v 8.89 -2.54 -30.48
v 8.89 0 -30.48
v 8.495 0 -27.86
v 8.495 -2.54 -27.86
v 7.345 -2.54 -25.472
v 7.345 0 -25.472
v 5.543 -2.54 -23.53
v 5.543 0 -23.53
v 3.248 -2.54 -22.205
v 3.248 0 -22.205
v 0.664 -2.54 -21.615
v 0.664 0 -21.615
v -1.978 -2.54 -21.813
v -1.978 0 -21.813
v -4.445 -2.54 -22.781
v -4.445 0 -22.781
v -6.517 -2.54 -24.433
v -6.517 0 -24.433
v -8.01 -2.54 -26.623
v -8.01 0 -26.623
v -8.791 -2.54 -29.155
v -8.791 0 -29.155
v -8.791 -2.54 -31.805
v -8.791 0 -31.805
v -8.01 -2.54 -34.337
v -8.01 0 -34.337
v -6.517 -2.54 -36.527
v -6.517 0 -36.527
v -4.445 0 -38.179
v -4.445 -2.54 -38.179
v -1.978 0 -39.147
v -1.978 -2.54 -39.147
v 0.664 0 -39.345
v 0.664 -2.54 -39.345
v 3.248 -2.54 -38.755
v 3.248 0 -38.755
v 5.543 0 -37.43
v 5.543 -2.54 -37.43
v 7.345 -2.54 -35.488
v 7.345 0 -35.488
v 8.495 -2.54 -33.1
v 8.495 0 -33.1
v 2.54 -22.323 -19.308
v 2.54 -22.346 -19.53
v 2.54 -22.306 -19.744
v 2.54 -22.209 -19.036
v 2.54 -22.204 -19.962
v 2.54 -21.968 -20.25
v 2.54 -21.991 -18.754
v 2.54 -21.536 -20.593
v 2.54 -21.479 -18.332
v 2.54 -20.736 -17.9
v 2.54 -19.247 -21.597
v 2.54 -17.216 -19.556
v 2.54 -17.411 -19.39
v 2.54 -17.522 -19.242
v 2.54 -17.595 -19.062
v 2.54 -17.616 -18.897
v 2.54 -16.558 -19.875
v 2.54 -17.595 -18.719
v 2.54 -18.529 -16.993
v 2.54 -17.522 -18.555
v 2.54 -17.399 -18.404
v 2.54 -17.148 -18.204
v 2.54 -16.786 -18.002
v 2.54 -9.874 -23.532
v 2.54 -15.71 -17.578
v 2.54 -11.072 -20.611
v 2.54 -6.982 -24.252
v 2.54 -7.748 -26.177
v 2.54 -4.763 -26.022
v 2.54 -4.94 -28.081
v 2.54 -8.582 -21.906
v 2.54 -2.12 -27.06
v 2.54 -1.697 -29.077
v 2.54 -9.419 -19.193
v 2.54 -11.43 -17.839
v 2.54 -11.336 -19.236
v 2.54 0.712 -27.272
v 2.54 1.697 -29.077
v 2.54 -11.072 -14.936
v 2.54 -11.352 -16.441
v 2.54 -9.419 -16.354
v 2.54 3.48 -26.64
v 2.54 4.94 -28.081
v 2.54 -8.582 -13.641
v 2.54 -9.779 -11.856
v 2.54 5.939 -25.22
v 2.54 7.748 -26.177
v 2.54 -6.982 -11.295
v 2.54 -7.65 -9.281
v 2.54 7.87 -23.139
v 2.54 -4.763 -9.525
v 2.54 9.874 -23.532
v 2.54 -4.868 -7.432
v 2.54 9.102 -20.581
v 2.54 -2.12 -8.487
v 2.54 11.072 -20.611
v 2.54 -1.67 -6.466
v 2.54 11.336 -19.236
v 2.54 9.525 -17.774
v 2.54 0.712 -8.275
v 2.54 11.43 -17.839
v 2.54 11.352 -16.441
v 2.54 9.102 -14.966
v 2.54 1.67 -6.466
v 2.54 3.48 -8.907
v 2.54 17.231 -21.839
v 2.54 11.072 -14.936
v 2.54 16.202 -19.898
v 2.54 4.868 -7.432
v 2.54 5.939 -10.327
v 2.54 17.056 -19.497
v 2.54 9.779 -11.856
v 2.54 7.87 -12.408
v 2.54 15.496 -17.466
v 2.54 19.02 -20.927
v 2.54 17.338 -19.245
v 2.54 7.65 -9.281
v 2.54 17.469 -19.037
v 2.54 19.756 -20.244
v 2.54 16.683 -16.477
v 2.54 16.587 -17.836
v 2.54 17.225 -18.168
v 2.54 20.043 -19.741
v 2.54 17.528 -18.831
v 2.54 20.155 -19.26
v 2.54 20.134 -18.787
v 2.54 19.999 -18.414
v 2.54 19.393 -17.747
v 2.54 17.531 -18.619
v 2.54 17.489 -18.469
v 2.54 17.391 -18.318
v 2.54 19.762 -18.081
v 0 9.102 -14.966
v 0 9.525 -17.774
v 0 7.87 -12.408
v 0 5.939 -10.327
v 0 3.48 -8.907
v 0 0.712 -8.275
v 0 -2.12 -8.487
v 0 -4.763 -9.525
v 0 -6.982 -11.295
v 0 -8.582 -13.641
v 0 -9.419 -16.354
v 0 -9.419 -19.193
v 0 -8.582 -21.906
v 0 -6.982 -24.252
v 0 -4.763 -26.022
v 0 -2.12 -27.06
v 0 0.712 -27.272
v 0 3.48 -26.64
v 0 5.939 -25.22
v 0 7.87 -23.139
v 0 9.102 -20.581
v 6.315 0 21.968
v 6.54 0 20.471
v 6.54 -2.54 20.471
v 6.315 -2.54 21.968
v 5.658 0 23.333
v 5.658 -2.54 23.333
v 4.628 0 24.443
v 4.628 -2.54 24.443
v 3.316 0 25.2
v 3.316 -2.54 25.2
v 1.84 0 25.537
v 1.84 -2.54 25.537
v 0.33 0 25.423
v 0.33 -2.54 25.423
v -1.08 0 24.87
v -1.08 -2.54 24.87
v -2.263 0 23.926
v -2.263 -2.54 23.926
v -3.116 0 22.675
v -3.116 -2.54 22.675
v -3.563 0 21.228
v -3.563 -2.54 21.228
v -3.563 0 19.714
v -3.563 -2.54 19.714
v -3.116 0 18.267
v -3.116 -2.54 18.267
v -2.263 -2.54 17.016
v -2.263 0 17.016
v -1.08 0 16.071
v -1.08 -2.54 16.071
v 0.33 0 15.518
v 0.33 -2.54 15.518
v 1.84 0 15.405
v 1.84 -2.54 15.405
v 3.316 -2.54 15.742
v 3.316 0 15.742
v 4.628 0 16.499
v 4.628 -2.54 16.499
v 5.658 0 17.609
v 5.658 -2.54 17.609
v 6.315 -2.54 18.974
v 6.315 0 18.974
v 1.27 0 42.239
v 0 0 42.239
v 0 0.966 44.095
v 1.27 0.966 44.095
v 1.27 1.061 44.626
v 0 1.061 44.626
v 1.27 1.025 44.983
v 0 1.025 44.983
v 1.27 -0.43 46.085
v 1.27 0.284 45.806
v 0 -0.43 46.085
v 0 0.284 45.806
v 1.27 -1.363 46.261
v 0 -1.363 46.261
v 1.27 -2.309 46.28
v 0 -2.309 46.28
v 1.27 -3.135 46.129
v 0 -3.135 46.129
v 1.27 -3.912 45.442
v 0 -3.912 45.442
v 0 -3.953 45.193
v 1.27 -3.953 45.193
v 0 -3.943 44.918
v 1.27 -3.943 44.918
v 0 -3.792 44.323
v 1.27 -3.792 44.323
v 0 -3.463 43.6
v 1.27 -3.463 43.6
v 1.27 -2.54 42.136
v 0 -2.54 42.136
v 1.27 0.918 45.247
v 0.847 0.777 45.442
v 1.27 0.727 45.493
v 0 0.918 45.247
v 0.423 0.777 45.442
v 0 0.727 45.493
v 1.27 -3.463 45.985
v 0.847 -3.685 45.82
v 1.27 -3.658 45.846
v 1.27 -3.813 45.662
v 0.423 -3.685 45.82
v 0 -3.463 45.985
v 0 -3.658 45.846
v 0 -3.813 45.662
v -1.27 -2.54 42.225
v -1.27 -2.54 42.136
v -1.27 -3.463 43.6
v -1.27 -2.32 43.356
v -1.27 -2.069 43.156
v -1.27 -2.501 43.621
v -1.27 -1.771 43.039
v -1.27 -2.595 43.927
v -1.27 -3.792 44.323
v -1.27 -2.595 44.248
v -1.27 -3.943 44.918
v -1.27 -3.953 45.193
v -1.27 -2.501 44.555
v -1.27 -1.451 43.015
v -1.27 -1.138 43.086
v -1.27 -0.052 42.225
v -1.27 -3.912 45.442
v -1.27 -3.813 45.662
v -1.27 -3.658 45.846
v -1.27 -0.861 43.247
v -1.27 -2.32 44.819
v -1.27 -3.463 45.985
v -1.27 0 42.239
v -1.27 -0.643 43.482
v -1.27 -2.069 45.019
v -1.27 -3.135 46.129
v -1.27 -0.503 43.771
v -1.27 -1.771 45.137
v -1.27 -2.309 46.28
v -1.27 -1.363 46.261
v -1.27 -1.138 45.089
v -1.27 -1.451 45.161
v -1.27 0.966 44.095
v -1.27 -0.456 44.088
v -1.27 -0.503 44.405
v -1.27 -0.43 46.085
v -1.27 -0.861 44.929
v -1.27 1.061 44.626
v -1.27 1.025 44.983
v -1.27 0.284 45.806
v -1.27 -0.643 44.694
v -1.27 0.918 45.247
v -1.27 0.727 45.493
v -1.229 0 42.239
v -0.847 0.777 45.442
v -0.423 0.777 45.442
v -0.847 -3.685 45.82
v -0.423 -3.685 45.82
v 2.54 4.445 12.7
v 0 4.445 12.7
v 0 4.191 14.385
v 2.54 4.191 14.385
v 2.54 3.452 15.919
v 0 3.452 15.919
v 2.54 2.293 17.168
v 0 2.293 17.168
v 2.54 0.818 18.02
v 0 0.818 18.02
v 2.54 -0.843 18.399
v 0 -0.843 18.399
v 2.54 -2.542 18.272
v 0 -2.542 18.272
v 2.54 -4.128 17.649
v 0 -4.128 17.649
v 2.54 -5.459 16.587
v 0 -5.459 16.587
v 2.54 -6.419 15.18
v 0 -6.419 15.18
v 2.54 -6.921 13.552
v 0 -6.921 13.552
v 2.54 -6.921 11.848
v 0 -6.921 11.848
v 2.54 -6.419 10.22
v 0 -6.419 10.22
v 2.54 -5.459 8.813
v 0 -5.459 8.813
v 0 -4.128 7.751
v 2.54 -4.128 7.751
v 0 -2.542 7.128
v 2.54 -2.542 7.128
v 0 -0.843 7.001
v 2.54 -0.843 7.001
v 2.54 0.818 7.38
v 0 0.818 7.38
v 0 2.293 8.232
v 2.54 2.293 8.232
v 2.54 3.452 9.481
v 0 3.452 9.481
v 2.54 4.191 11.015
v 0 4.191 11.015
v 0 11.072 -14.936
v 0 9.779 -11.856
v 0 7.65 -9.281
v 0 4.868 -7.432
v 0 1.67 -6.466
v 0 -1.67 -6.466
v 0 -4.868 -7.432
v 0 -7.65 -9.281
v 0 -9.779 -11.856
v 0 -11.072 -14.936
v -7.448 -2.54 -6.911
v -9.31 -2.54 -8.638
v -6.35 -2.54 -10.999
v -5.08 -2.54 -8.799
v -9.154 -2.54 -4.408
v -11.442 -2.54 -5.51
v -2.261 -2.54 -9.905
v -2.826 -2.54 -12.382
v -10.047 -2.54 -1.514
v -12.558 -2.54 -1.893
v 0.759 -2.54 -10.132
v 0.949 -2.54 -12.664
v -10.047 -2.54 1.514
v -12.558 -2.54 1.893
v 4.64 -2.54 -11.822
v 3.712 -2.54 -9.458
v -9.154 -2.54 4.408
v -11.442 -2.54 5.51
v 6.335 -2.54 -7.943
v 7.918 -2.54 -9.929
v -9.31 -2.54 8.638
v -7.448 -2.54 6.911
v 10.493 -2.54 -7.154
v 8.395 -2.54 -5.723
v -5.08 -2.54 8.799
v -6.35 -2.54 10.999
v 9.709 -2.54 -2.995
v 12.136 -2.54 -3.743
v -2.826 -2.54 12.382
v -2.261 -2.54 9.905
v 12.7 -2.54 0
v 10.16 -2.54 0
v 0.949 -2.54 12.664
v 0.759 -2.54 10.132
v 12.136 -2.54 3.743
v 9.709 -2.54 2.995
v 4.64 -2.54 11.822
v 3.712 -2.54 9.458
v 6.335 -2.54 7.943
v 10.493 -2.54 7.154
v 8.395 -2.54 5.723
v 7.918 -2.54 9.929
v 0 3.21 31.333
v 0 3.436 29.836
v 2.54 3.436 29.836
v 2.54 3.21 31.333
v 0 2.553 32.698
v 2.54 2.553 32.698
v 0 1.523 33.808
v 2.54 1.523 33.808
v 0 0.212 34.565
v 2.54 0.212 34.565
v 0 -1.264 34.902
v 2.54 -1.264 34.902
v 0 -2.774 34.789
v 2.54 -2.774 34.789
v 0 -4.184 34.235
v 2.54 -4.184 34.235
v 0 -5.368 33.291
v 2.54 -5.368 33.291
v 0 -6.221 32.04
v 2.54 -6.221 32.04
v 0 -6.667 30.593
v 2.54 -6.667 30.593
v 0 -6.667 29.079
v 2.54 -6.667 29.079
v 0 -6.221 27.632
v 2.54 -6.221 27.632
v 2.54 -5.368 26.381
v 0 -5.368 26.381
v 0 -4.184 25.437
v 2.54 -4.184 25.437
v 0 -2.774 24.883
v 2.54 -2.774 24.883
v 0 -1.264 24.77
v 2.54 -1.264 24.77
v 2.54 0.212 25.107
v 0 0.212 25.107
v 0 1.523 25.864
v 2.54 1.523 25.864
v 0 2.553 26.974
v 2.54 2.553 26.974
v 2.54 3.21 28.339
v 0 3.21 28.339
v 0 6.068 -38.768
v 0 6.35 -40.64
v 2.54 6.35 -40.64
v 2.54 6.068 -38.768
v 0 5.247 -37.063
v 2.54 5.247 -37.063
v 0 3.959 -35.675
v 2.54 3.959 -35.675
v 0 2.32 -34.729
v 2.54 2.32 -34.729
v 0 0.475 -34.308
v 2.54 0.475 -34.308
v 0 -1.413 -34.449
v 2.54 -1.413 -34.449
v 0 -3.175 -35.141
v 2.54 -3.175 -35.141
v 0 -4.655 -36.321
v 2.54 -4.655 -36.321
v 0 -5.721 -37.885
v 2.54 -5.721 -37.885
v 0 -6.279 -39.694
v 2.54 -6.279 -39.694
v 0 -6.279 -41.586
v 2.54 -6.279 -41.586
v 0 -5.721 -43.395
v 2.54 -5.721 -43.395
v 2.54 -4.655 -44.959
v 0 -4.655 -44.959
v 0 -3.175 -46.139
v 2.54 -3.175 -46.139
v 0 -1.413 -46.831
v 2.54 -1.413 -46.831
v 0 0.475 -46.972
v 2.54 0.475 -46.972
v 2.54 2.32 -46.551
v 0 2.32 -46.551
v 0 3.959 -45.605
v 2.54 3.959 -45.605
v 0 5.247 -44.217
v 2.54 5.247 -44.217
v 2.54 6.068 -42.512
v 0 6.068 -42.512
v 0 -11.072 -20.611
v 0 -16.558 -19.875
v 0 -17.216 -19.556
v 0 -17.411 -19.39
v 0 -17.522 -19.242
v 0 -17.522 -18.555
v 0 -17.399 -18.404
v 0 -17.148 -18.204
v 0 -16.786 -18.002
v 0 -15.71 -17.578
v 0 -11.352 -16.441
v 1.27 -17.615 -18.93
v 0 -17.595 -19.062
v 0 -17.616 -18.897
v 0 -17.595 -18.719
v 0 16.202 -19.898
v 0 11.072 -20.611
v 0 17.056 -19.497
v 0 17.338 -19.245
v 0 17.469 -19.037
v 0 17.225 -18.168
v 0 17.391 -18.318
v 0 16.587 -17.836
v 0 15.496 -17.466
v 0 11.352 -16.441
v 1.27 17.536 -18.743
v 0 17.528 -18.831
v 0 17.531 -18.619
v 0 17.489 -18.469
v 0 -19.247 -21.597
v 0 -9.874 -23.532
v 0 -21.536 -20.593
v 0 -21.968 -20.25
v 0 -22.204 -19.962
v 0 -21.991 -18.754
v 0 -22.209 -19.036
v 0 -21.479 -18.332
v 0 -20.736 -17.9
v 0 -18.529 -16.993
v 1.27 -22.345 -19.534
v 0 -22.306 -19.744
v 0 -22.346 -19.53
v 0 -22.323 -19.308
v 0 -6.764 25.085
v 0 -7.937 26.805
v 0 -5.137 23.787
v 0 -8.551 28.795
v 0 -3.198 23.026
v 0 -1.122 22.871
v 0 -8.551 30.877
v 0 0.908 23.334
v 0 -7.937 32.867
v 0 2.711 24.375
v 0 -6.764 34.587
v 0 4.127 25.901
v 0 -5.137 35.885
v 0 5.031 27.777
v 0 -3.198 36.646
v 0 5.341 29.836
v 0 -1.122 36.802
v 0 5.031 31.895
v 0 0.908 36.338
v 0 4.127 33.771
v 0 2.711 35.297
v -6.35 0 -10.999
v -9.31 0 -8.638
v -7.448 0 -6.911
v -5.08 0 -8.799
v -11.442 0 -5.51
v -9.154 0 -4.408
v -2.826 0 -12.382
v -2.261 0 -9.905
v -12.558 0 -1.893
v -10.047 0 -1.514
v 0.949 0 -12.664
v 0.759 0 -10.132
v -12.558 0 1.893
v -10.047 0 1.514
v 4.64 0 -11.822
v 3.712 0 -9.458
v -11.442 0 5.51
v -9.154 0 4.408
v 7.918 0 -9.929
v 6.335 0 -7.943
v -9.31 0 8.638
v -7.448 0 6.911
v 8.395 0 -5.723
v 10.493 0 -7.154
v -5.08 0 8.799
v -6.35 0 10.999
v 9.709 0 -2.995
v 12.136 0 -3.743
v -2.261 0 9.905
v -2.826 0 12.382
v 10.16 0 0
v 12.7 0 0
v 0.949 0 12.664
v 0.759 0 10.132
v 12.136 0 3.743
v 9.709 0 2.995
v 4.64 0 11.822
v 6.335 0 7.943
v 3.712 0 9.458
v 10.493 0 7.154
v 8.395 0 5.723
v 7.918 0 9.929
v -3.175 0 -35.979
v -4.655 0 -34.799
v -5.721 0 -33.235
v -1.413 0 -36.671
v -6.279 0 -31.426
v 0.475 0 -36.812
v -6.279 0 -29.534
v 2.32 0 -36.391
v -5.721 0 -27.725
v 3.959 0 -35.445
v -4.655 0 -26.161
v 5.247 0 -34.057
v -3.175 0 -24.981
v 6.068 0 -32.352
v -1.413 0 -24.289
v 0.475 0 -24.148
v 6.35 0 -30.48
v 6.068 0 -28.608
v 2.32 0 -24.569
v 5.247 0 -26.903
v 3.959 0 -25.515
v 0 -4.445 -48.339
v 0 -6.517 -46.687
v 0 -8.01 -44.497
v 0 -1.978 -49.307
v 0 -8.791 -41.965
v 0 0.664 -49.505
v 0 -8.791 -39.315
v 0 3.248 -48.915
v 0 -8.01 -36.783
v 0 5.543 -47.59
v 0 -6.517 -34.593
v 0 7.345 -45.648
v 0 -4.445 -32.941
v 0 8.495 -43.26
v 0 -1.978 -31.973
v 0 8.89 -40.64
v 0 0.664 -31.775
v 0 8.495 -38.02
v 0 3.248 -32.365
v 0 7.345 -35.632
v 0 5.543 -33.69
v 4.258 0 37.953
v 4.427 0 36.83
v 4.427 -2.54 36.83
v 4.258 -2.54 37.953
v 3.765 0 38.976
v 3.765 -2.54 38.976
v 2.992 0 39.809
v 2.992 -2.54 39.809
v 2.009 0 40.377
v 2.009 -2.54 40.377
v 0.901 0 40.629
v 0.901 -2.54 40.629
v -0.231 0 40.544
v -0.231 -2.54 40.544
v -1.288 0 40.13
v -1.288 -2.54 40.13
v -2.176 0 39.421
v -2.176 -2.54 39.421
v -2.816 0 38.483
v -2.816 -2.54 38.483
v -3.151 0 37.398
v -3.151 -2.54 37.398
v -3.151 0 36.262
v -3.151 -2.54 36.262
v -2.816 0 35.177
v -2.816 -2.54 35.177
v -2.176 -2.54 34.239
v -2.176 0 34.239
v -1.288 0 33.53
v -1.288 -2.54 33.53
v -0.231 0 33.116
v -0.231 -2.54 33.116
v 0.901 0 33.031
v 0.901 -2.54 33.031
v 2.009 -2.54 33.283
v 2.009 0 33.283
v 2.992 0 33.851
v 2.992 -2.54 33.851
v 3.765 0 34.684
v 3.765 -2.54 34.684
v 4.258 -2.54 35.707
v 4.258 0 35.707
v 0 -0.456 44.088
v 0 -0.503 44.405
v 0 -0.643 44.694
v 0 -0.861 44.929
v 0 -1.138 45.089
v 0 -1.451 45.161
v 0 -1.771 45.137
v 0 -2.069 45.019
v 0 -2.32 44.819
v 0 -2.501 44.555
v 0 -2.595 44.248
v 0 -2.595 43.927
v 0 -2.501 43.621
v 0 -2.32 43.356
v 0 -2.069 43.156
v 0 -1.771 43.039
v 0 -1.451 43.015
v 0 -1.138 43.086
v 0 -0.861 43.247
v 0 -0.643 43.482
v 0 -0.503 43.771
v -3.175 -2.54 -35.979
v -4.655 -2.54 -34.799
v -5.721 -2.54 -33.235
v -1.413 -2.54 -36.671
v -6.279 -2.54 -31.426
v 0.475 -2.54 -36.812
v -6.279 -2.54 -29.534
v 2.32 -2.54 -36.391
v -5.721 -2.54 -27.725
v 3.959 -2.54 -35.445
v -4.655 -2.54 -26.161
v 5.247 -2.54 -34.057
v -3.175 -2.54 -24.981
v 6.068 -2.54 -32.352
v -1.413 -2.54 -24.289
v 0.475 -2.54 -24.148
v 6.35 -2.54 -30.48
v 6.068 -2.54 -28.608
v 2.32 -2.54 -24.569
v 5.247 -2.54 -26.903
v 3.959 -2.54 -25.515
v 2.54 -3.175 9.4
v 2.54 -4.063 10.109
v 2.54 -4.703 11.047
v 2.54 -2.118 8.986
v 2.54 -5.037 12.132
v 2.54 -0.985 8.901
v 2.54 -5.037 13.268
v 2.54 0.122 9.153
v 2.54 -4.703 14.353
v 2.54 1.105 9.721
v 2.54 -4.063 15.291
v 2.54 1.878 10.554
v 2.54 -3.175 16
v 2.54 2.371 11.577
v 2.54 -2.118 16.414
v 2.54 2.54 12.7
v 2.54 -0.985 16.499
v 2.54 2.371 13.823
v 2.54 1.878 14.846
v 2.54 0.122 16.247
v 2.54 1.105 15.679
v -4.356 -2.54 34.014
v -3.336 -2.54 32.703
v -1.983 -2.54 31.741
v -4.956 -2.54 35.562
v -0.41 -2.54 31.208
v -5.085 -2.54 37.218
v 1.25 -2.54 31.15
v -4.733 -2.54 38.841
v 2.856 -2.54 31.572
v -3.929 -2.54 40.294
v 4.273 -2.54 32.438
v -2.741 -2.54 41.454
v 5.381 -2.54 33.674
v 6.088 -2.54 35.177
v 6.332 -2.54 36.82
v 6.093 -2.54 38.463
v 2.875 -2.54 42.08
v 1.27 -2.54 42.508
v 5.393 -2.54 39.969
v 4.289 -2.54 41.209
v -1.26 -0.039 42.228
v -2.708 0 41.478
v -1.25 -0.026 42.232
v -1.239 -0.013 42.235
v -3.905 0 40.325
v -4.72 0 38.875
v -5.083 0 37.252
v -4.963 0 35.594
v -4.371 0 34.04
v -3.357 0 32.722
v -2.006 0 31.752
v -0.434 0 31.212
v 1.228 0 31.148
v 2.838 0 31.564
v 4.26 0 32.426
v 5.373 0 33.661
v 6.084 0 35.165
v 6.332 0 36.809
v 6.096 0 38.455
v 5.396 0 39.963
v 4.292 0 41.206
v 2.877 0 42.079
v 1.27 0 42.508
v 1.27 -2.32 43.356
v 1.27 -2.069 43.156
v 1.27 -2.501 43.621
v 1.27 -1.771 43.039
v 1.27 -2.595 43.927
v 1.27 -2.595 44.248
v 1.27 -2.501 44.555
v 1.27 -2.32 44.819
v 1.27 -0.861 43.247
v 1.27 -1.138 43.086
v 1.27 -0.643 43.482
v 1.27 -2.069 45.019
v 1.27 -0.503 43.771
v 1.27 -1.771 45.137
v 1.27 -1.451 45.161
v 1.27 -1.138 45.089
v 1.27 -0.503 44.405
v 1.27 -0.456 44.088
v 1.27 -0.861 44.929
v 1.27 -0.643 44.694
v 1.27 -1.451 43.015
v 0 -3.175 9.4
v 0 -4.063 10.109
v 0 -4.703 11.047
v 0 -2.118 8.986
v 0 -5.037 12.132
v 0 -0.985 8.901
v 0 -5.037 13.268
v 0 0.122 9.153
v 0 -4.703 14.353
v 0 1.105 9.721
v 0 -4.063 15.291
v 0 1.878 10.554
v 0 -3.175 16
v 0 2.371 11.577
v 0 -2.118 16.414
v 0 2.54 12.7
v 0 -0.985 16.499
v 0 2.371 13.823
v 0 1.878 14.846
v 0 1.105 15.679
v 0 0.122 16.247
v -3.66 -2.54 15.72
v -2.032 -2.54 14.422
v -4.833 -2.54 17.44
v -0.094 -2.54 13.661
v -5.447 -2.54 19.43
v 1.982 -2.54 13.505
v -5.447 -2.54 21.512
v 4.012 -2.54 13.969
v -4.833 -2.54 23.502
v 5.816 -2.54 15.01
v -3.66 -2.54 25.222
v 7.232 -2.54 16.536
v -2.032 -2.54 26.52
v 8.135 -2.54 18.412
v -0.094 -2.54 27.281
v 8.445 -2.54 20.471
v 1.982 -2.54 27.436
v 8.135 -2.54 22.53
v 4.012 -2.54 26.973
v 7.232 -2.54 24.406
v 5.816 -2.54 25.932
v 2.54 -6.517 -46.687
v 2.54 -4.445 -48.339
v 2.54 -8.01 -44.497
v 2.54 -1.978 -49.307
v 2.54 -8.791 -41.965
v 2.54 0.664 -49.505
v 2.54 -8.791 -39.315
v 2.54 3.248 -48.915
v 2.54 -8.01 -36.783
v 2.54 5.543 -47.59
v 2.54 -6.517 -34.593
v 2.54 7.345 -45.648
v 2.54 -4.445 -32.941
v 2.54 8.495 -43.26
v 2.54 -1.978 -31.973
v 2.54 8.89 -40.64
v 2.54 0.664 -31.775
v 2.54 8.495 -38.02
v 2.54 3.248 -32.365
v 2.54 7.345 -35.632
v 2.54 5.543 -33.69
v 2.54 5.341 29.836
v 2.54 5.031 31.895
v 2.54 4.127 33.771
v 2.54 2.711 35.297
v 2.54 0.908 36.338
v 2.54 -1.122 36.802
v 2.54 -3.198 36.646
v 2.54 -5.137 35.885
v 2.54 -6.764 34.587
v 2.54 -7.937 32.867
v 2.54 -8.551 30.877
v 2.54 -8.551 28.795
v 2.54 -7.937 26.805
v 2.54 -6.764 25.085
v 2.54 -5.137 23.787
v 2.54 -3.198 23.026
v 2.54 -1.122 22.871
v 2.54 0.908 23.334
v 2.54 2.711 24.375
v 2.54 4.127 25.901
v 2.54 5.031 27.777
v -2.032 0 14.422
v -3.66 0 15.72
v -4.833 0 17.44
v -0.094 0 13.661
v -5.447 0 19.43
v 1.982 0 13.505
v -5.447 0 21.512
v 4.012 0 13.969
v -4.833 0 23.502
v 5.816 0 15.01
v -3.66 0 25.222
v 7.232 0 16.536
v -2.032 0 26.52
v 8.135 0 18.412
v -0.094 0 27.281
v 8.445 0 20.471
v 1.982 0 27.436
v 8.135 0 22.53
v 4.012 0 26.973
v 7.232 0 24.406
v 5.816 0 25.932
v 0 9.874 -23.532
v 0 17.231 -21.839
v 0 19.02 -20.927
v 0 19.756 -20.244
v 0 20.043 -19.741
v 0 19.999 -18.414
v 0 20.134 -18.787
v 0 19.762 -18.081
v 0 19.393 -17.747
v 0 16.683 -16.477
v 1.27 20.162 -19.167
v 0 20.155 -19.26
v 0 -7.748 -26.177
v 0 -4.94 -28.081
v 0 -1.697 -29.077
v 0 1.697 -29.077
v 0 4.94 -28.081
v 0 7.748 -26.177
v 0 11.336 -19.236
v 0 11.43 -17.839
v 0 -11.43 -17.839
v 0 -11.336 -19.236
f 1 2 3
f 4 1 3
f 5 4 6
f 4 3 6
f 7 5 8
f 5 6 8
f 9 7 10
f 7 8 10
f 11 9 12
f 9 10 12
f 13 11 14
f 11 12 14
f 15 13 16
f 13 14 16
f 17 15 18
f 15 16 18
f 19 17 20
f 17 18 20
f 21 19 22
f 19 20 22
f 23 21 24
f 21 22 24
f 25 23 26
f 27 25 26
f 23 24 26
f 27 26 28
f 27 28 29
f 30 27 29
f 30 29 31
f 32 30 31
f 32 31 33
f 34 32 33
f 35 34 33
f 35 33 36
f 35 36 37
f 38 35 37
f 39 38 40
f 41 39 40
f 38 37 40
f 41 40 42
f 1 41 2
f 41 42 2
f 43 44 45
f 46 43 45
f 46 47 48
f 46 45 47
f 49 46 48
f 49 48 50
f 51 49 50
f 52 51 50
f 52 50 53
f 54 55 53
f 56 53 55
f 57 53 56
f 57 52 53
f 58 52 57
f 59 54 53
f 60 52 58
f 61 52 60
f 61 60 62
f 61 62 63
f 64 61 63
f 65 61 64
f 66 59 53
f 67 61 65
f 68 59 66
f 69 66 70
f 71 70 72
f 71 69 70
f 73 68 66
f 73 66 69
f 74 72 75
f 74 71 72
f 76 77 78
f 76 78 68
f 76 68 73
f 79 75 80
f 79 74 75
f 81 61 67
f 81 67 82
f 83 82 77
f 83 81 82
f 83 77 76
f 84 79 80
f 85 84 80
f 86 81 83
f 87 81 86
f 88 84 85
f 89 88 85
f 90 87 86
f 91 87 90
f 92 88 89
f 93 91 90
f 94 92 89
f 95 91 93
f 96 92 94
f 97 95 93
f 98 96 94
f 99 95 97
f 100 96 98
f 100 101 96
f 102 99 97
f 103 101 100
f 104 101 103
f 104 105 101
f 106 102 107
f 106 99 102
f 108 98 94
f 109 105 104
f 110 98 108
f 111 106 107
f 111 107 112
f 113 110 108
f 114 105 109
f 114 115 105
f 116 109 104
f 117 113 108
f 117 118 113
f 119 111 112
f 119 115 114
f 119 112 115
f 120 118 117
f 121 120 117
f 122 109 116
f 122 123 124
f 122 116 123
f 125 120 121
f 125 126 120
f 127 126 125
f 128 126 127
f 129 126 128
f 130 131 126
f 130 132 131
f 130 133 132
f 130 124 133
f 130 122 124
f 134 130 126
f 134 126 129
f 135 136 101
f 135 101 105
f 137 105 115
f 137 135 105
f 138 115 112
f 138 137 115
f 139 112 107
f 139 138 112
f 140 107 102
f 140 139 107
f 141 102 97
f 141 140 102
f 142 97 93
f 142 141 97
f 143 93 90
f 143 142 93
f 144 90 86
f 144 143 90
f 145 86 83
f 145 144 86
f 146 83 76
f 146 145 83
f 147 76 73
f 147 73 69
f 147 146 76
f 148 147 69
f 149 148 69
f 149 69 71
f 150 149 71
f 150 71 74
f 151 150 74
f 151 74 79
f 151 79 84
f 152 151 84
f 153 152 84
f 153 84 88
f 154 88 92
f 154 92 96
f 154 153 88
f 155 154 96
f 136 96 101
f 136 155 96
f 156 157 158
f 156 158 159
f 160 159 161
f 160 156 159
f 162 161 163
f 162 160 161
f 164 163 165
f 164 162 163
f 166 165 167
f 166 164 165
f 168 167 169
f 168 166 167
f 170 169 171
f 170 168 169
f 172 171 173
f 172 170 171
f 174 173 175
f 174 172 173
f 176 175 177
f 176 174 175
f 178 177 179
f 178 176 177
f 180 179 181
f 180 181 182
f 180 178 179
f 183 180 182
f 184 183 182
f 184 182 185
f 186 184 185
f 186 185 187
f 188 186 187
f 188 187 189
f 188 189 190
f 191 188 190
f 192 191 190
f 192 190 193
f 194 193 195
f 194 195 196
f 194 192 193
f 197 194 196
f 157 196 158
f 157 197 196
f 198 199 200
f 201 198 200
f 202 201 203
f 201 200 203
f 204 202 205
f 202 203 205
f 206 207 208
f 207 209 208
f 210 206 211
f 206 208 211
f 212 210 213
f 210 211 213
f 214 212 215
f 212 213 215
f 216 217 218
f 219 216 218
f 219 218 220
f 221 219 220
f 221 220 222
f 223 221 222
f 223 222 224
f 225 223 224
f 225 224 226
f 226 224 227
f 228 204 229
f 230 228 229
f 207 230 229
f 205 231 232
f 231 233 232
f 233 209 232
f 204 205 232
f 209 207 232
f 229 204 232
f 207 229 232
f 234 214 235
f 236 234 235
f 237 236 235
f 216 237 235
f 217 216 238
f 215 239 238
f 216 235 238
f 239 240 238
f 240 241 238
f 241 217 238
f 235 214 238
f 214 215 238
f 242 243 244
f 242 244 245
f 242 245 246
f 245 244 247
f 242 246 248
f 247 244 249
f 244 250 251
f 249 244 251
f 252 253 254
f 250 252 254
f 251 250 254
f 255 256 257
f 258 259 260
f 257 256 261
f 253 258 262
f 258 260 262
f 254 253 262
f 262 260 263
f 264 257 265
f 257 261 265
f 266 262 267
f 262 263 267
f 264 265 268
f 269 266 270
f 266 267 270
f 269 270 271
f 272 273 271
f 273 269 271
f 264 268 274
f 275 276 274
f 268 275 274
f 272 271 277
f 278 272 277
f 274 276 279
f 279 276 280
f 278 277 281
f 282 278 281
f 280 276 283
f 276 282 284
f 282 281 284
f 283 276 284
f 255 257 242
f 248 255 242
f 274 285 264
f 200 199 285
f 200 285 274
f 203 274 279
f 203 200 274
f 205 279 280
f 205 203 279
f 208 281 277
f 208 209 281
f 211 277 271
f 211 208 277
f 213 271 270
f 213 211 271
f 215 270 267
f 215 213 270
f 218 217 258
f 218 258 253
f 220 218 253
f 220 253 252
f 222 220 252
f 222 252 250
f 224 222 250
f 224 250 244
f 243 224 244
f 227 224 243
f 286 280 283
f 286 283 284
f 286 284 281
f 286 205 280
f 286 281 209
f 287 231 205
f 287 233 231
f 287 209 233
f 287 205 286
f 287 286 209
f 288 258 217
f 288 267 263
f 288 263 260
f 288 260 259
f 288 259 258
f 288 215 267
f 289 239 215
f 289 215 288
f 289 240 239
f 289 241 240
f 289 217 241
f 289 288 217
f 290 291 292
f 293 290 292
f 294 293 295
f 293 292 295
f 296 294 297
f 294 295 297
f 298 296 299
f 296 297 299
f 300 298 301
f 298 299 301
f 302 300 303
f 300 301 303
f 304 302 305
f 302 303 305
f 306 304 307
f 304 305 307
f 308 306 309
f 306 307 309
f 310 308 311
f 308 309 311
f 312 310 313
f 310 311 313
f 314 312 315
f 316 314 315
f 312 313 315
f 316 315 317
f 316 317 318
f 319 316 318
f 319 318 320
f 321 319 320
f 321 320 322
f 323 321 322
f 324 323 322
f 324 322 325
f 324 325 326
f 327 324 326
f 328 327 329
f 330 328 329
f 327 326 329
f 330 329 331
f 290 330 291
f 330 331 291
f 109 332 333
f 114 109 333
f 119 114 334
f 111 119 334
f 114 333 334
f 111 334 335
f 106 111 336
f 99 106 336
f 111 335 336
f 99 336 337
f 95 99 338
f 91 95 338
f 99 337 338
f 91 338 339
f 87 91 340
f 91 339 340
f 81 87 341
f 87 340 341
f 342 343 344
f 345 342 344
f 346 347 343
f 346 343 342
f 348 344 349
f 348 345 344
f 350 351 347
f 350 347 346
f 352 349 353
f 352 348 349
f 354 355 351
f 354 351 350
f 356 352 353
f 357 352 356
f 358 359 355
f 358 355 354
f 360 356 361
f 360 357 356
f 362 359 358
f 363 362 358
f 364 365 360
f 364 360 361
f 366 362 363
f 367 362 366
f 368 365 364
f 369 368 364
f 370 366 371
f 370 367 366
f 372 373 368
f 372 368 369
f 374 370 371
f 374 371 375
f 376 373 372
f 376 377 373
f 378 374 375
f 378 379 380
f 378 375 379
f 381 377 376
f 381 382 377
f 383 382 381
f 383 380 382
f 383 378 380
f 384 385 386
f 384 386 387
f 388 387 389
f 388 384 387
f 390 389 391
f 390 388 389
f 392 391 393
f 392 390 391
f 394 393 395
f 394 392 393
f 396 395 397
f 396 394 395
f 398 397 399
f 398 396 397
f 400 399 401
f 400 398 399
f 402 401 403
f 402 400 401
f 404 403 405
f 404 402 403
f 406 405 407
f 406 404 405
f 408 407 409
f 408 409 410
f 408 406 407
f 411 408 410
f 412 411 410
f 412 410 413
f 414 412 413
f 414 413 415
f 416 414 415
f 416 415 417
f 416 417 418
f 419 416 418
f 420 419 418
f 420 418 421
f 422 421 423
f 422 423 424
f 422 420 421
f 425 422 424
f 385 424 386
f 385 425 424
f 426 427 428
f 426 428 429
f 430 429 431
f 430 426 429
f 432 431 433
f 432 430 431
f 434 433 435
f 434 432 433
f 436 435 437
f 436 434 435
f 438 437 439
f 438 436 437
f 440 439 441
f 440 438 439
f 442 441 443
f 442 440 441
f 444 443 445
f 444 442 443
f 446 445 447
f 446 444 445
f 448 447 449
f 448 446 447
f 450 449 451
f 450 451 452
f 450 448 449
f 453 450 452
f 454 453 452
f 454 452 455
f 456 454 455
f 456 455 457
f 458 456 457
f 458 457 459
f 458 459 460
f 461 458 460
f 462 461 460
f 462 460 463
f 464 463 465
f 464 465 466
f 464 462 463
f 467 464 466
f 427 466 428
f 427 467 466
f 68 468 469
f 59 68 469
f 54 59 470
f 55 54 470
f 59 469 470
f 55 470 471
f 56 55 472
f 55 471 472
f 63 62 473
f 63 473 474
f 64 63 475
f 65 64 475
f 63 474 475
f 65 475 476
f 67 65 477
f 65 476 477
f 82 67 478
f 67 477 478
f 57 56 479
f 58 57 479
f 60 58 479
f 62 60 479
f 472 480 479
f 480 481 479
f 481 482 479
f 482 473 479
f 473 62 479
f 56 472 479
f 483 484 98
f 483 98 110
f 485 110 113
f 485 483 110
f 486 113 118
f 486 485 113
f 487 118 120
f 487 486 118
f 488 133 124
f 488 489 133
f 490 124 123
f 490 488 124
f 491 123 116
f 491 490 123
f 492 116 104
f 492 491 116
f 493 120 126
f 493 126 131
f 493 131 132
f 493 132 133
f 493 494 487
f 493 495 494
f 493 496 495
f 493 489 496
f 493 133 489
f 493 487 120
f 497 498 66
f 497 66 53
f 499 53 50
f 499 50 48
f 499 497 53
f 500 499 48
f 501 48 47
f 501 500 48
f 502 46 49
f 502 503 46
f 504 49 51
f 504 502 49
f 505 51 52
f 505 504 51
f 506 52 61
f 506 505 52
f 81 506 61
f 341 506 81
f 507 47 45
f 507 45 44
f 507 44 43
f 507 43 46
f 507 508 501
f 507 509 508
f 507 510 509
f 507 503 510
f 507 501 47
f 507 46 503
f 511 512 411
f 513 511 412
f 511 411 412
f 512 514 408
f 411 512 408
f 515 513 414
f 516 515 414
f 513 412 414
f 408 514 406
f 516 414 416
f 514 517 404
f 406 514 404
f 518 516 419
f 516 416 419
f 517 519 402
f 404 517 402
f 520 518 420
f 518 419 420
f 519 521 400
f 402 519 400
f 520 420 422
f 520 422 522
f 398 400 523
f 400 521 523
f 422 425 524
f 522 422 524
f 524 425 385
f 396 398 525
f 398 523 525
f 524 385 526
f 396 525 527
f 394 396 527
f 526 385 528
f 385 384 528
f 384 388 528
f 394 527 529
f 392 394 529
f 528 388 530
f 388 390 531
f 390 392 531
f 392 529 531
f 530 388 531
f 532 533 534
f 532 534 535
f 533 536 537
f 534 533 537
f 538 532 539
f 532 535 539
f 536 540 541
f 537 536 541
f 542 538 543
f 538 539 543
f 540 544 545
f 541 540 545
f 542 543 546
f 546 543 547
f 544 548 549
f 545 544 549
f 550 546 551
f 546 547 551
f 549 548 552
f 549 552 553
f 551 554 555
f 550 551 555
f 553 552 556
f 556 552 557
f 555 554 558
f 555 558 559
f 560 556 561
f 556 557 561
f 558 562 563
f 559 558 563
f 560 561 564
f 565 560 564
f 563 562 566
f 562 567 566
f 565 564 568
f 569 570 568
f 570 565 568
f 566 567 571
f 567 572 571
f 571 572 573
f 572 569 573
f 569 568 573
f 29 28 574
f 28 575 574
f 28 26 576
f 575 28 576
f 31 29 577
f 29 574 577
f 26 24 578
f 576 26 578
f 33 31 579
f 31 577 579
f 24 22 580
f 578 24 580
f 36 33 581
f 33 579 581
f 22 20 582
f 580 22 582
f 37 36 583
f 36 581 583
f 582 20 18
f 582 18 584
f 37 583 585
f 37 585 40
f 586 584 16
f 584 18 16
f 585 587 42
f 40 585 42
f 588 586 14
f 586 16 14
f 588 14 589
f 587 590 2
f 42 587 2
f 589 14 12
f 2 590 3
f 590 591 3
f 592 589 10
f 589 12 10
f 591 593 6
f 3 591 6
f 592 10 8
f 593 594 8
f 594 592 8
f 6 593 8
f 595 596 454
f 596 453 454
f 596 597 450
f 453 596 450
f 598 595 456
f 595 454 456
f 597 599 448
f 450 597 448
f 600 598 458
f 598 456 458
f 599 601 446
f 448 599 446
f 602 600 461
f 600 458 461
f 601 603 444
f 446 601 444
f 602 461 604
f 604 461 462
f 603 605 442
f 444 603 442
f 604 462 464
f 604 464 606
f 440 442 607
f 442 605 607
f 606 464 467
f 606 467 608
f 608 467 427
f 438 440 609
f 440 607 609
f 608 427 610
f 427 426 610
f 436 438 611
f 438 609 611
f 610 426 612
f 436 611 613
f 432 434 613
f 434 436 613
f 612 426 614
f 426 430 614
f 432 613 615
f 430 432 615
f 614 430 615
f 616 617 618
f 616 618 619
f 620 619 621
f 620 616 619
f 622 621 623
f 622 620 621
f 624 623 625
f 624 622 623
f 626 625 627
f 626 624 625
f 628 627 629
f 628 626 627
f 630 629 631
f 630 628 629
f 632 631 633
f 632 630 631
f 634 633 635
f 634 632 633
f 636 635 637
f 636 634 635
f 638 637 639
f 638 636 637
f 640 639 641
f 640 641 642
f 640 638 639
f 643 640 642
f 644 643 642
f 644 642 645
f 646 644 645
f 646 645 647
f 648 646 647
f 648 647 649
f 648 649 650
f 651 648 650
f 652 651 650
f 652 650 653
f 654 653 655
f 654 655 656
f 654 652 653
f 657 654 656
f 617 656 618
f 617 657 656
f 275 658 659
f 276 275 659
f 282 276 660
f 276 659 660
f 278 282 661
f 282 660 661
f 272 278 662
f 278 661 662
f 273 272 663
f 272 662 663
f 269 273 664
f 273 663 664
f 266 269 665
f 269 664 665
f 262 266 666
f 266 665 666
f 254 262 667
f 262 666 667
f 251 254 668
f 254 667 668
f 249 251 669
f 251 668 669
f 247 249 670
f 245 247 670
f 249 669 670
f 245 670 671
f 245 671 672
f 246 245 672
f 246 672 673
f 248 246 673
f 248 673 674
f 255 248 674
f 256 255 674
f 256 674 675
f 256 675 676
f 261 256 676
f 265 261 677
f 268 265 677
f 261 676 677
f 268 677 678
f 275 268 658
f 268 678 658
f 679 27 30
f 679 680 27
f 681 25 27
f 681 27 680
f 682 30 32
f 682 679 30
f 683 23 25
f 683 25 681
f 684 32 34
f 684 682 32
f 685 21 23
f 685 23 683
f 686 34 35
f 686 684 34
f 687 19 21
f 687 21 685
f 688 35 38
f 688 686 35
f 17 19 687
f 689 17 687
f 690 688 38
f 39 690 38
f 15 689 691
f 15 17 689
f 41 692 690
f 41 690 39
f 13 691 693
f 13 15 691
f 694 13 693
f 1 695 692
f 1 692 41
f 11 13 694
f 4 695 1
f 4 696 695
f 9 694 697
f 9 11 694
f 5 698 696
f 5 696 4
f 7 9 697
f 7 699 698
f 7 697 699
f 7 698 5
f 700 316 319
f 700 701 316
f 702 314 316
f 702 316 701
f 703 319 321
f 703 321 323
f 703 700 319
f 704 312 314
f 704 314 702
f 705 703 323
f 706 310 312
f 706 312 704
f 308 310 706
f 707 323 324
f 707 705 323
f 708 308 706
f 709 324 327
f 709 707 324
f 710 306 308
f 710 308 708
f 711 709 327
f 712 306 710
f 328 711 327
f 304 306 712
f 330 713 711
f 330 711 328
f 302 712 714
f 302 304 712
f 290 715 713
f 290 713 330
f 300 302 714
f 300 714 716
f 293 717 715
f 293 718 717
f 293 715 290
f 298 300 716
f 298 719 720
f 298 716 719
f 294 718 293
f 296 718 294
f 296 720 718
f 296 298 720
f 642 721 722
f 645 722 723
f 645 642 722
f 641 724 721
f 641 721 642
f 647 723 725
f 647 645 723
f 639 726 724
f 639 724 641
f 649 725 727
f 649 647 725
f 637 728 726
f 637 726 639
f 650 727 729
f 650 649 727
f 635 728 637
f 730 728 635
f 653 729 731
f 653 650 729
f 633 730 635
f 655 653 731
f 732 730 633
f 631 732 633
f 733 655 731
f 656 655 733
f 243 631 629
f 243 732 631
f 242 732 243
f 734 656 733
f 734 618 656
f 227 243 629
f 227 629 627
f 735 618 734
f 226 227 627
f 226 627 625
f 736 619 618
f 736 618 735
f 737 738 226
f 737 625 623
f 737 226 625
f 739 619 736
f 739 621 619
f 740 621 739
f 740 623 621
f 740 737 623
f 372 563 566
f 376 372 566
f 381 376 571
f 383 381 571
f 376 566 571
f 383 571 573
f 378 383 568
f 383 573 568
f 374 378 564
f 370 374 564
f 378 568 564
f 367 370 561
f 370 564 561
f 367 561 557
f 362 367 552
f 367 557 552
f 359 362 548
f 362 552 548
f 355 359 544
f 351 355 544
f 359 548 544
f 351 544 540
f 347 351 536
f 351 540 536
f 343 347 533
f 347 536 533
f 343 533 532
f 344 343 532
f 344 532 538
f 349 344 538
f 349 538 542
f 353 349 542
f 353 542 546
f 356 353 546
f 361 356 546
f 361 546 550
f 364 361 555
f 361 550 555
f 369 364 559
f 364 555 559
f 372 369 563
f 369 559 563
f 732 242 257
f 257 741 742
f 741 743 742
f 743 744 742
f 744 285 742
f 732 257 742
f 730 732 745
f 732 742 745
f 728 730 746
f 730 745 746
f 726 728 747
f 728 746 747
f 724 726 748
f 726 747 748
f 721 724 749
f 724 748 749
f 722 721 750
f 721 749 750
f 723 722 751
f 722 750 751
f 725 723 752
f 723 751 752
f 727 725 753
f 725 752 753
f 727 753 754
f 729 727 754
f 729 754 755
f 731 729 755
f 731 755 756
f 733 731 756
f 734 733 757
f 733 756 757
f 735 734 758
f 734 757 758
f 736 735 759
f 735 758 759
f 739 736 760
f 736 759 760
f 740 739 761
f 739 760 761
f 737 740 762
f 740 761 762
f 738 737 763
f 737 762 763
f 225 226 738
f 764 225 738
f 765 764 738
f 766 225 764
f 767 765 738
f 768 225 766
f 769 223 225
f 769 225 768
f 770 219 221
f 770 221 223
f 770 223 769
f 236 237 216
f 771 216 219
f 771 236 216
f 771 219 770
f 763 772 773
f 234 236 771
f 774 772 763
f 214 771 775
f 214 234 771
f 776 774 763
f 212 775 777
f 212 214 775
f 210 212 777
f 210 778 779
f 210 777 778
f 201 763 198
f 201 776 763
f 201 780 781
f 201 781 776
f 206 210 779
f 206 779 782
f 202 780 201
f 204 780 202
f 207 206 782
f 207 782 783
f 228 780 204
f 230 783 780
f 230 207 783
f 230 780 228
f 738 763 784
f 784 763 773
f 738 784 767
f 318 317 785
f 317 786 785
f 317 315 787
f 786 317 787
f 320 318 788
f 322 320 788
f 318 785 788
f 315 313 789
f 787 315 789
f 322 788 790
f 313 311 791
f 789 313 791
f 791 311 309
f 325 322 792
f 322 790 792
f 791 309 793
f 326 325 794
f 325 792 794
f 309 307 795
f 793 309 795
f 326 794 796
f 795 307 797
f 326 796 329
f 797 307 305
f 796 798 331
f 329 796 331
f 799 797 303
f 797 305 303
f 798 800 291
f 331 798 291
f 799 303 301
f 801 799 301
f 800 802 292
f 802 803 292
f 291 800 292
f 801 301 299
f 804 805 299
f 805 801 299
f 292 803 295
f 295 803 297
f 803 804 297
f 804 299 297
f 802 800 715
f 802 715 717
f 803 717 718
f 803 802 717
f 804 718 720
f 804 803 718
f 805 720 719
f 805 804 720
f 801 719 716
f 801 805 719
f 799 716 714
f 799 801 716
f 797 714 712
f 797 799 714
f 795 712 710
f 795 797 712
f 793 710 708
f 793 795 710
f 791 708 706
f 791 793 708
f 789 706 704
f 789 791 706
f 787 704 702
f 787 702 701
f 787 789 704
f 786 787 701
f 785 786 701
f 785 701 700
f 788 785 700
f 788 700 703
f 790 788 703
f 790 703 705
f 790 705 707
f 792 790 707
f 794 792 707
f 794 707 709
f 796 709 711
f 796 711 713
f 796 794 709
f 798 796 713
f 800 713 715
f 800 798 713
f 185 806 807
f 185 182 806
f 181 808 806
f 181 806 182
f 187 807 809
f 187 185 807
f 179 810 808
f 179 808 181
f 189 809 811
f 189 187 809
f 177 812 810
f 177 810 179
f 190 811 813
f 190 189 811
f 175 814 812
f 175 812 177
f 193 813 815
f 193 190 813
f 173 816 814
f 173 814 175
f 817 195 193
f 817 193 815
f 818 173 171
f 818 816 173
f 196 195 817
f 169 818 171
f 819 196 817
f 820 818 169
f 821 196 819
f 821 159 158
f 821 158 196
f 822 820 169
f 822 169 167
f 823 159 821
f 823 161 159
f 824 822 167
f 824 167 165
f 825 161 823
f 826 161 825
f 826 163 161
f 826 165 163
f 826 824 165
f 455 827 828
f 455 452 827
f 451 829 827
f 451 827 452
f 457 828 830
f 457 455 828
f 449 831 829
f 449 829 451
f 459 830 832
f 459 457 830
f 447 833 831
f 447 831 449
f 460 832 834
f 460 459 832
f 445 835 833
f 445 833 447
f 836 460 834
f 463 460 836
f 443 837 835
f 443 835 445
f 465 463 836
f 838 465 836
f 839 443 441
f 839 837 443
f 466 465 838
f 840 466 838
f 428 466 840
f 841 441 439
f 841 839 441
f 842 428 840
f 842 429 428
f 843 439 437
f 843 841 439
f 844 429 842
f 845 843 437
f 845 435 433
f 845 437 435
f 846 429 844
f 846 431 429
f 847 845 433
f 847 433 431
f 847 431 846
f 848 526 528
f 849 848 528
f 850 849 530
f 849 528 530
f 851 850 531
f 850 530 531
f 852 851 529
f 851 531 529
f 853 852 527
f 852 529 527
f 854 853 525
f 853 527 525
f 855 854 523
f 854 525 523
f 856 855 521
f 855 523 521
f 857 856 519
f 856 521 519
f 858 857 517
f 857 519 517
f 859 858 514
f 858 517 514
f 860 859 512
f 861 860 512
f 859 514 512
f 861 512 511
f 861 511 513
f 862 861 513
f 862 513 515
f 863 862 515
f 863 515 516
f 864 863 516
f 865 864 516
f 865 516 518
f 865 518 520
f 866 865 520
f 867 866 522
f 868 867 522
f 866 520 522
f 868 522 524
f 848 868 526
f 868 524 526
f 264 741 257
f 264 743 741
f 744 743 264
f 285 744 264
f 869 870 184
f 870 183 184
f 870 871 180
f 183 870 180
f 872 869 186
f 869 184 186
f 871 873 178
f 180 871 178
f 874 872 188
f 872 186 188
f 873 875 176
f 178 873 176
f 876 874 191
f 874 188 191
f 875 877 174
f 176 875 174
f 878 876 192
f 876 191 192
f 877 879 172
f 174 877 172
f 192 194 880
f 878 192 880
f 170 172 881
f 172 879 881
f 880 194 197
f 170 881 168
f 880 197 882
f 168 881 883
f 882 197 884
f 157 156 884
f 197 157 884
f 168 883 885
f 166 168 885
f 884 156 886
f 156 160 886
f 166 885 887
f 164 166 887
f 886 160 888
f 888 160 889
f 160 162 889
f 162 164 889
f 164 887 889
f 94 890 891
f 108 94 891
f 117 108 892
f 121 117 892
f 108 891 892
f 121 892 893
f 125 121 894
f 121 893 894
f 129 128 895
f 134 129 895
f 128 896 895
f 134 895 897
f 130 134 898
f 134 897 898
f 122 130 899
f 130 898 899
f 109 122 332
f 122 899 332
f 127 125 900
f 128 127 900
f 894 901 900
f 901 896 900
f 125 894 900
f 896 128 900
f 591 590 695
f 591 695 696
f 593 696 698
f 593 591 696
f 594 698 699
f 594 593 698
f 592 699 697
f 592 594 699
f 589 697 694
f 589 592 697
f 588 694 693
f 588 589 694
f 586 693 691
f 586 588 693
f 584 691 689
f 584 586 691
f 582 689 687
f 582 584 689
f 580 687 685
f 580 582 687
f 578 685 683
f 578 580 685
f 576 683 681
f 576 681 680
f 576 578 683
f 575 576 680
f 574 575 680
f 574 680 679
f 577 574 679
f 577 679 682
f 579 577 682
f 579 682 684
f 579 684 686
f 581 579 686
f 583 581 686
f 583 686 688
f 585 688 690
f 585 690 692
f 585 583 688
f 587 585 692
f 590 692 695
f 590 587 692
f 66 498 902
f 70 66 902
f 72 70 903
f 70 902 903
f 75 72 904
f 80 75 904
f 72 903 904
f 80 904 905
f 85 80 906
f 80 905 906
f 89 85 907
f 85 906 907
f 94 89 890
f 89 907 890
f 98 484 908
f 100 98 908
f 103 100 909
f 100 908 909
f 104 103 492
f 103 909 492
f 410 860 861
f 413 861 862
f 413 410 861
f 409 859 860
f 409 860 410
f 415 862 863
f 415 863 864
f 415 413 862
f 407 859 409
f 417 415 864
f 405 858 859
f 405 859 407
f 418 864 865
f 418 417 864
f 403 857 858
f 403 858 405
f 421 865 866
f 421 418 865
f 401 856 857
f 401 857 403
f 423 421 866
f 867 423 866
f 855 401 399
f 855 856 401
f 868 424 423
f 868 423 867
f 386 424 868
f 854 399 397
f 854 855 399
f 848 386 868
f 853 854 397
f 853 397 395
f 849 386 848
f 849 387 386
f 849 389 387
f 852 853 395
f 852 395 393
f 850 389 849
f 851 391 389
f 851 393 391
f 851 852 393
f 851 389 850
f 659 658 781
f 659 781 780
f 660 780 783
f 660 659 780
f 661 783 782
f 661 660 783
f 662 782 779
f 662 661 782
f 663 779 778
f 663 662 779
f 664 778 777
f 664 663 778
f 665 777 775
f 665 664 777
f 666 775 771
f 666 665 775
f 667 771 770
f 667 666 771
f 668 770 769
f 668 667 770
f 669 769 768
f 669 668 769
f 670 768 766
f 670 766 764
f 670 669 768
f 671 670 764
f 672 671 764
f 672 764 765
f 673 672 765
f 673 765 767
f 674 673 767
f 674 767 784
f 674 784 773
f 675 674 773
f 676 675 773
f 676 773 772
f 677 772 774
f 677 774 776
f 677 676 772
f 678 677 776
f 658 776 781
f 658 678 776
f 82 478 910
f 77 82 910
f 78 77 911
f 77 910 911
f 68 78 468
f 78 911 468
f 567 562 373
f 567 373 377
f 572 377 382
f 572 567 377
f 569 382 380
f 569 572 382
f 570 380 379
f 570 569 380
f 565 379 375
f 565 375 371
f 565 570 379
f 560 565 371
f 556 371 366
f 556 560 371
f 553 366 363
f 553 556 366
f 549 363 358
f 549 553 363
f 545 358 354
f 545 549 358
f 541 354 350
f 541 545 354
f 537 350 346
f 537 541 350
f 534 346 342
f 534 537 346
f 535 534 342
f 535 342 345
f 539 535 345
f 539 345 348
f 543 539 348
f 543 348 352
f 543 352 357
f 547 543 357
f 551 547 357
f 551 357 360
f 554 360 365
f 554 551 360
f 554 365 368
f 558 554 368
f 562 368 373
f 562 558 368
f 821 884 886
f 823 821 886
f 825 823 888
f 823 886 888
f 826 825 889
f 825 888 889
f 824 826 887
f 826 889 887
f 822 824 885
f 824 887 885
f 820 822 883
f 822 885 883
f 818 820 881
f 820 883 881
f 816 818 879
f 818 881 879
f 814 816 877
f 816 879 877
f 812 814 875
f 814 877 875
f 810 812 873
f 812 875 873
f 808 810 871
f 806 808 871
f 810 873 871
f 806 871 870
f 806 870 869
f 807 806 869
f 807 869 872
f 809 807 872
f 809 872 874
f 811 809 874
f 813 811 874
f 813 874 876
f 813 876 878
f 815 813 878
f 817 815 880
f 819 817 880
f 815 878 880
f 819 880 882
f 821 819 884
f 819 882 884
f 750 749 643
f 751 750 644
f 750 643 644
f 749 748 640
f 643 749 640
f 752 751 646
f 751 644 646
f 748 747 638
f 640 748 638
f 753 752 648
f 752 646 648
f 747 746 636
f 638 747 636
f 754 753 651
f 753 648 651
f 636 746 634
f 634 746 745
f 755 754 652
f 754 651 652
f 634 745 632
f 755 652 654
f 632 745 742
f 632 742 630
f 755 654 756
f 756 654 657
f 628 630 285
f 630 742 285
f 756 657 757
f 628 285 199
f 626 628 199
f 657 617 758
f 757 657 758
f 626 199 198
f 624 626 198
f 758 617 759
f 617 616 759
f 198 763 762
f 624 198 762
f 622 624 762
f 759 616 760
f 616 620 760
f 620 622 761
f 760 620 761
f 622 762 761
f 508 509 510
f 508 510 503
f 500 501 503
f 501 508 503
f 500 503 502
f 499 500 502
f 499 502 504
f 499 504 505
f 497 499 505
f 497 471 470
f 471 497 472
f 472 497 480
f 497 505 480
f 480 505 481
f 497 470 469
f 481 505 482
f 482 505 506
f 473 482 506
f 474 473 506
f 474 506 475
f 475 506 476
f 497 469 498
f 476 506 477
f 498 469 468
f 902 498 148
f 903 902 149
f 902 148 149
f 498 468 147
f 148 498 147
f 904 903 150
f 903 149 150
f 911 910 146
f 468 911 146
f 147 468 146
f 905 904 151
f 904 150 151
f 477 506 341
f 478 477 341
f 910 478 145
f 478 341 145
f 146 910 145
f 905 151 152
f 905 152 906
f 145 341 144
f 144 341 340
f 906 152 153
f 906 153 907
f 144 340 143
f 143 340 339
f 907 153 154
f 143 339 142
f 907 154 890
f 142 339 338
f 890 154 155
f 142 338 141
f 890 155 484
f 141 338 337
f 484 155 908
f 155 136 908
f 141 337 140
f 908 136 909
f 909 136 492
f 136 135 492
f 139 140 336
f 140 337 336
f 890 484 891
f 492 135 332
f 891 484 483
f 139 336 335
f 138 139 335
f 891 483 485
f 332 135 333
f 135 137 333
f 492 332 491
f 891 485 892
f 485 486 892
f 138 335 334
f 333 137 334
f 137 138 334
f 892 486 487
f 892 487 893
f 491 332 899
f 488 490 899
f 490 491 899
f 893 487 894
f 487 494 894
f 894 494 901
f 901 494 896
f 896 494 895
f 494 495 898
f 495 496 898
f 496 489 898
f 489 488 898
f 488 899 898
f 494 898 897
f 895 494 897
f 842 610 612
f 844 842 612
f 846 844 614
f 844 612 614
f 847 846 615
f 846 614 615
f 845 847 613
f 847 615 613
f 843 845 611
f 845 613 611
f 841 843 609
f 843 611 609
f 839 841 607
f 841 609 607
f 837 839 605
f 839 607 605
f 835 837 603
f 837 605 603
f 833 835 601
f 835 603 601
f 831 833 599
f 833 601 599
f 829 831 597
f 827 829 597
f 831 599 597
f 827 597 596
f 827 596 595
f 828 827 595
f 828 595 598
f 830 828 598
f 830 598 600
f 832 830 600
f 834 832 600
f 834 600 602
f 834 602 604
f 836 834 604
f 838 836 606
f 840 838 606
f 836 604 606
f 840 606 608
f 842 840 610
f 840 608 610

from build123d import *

# Parameters (mm, degrees)
F0_R           = 12.7
F0_R_2         = 10.16
F1_DEPTH       = 2.54
F2_R           = 9.525
F3_DEPTH       = 2.54
F4_R           = 8.89
F4_R_2         = 6.35
F5_DEPTH       = 2.54
F6_R           = 8.89
F6_R_2         = 6.35
F7_DEPTH       = 2.54
F8_R           = 5.715
F8_R_2         = 3.81
F9_DEPTH       = 2.54
F10_R          = 6.985
F10_R_2        = 5.08
F11_DEPTH      = 2.54
F12_R          = 6.985
F12_R_2        = 5.08
F13_DEPTH      = 2.54
F14_R          = 5.715
F14_R_2        = 3.81
F15_DEPTH      = 2.54
F16_R          = 1.0757823603
F17_DEPTH      = 1.27
F17_DEPTH_BACK = 1.27


with BuildPart() as f1:
    # F0 (on Front) → F1 (new body)
    with BuildSketch(Plane.XZ):
        Circle(F0_R)
        Circle(F0_R_2, mode=Mode.SUBTRACT)
    extrude(amount=F1_DEPTH)


with BuildPart() as f3:
    # F2 (on Right) → F3 (new body)
    with BuildSketch(Plane.YZ):
        with BuildLine():
            ThreePointArc((-9.8736218887, -23.5316872631), (0, -29.2035199505), (9.8736218887, -23.5316872631))
            add(Edge.make_bspline(
                [(9.8736218887, -23.5316872631), (18.5105518516, -22.2576764036), (21.6086618873, -18.9620666412), (18.9019507014, -16.7834548757), (11.072217572, -14.9361095045)],
                knots=[0, 0, 0, 0, 0.5135644631, 1, 1, 1, 1], degree=3))
            ThreePointArc((11.072217572, -14.9361095045), (0, -6.3435199505), (-11.072217572, -14.9361095045))
            add(Edge.make_bspline(
                [(-9.8736218887, -23.5316872631), (-18.4358443999, -22.2686963036), (-25.9786251634, -19.6339256012), (-18.9734531893, -16.8003251557), (-11.072217572, -14.9361095045)],
                knots=[0, 0, 0, 0, 0.509122249, 1, 1, 1, 1], degree=3))
        make_face()
        with BuildLine():
            ThreePointArc((-11.35202354, -16.4406802948), (-11.4043585457, -18.5387036936), (-11.072217572, -20.6109303965))
            add(Edge.make_bspline(
                [(-11.072217572, -20.6109303965), (-16.7074210707, -20.3306461976), (-18.4387812048, -18.8565427148), (-16.8743774282, -17.6803462503), (-11.35202354, -16.4406802948)],
                knots=[0, 0, 0, 0, 0.50028794, 1, 1, 1, 1], degree=3))
        make_face(mode=Mode.SUBTRACT)
        with BuildLine():
            add(Edge.make_bspline(
                [(11.072217572, -20.6109303965), (16.7316006123, -20.3294435537), (18.2808743755, -18.4961720191), (16.8506547949, -17.6750209594), (11.35202354, -16.4406802948)],
                knots=[0, 0, 0, 0, 0.5024345764, 1, 1, 1, 1], degree=3))
            ThreePointArc((11.072217572, -20.6109303965), (11.4043585457, -18.5387036936), (11.35202354, -16.4406802948))
        make_face(mode=Mode.SUBTRACT)
        with Locations((0, -17.7735199505)):
            Circle(F2_R, mode=Mode.SUBTRACT)
    extrude(amount=F3_DEPTH)


with BuildPart() as f5:
    # F4 (on Front) → F5 (new body)
    with BuildSketch(Plane.XZ):
        with Locations((0, -30.48)):
            Circle(F4_R)
        with Locations((0, -30.48)):
            Circle(F4_R_2, mode=Mode.SUBTRACT)
    extrude(amount=F5_DEPTH)


with BuildPart() as f7:
    # F6 (on Right) → F7 (new body)
    with BuildSketch(Plane.YZ):
        with Locations((0, -40.64)):
            Circle(F6_R)
        with Locations((0, -40.64)):
            Circle(F6_R_2, mode=Mode.SUBTRACT)
    extrude(amount=F7_DEPTH)


with BuildPart() as f9:
    # F8 (on Right) → F9 (new body)
    with BuildSketch(Plane.YZ):
        with Locations((-1.27, 12.7)):
            Circle(F8_R)
        with Locations((-1.27, 12.7)):
            Circle(F8_R_2, mode=Mode.SUBTRACT)
    extrude(amount=F9_DEPTH)


with BuildPart() as f11:
    # F10 (on Front) → F11 (new body)
    with BuildSketch(Plane.XZ):
        with Locations((1.4604773605, 20.4708576202)):
            Circle(F10_R)
        with Locations((1.4604773605, 20.4708576202)):
            Circle(F10_R_2, mode=Mode.SUBTRACT)
    extrude(amount=F11_DEPTH)


with BuildPart() as f13:
    # F12 (on Right) → F13 (new body)
    with BuildSketch(Plane.YZ):
        with Locations((-1.644058153, 29.8360362649)):
            Circle(F12_R)
        with Locations((-1.644058153, 29.8360362649)):
            Circle(F12_R_2, mode=Mode.SUBTRACT)
    extrude(amount=F13_DEPTH)


with BuildPart() as f15:
    # F14 (on Front) → F15 (new body)
    with BuildSketch(Plane.XZ):
        with Locations((0.6167717511, 36.83)):
            Circle(F14_R)
        with Locations((0.6167717511, 36.83)):
            Circle(F14_R_2, mode=Mode.SUBTRACT)
    extrude(amount=F15_DEPTH)

    # F16 (on Right) → F17 (join, two sides)
    with BuildSketch(Plane.YZ) as f17_sk:
        with BuildLine():
            Line((-2.186801983, 41.6470505297), (0, 42.2387383878))
            add(Edge.make_bspline(
                [(0, 42.2387383878), (0.732275642, 43.3974169157), (2.3665027509, 46.1301105442), (-5.6733430923, 46.872656682), (-3.3271464123, 43.1967134954), (-2.186801983, 41.6470505297)],
                knots=[0, 0, 0, 0, 0.300701065, 0.6512185434, 1, 1, 1, 1], degree=3))
        make_face()
        with Locations((-1.5314007178, 44.087741524)):
            Circle(F16_R, mode=Mode.SUBTRACT)
    extrude(amount=F17_DEPTH)
    extrude(f17_sk.sketch, amount=-F17_DEPTH_BACK)


solid = Compound([f1.part, f3.part, f5.part, f7.part, f9.part, f11.part, f13.part, f15.part])
